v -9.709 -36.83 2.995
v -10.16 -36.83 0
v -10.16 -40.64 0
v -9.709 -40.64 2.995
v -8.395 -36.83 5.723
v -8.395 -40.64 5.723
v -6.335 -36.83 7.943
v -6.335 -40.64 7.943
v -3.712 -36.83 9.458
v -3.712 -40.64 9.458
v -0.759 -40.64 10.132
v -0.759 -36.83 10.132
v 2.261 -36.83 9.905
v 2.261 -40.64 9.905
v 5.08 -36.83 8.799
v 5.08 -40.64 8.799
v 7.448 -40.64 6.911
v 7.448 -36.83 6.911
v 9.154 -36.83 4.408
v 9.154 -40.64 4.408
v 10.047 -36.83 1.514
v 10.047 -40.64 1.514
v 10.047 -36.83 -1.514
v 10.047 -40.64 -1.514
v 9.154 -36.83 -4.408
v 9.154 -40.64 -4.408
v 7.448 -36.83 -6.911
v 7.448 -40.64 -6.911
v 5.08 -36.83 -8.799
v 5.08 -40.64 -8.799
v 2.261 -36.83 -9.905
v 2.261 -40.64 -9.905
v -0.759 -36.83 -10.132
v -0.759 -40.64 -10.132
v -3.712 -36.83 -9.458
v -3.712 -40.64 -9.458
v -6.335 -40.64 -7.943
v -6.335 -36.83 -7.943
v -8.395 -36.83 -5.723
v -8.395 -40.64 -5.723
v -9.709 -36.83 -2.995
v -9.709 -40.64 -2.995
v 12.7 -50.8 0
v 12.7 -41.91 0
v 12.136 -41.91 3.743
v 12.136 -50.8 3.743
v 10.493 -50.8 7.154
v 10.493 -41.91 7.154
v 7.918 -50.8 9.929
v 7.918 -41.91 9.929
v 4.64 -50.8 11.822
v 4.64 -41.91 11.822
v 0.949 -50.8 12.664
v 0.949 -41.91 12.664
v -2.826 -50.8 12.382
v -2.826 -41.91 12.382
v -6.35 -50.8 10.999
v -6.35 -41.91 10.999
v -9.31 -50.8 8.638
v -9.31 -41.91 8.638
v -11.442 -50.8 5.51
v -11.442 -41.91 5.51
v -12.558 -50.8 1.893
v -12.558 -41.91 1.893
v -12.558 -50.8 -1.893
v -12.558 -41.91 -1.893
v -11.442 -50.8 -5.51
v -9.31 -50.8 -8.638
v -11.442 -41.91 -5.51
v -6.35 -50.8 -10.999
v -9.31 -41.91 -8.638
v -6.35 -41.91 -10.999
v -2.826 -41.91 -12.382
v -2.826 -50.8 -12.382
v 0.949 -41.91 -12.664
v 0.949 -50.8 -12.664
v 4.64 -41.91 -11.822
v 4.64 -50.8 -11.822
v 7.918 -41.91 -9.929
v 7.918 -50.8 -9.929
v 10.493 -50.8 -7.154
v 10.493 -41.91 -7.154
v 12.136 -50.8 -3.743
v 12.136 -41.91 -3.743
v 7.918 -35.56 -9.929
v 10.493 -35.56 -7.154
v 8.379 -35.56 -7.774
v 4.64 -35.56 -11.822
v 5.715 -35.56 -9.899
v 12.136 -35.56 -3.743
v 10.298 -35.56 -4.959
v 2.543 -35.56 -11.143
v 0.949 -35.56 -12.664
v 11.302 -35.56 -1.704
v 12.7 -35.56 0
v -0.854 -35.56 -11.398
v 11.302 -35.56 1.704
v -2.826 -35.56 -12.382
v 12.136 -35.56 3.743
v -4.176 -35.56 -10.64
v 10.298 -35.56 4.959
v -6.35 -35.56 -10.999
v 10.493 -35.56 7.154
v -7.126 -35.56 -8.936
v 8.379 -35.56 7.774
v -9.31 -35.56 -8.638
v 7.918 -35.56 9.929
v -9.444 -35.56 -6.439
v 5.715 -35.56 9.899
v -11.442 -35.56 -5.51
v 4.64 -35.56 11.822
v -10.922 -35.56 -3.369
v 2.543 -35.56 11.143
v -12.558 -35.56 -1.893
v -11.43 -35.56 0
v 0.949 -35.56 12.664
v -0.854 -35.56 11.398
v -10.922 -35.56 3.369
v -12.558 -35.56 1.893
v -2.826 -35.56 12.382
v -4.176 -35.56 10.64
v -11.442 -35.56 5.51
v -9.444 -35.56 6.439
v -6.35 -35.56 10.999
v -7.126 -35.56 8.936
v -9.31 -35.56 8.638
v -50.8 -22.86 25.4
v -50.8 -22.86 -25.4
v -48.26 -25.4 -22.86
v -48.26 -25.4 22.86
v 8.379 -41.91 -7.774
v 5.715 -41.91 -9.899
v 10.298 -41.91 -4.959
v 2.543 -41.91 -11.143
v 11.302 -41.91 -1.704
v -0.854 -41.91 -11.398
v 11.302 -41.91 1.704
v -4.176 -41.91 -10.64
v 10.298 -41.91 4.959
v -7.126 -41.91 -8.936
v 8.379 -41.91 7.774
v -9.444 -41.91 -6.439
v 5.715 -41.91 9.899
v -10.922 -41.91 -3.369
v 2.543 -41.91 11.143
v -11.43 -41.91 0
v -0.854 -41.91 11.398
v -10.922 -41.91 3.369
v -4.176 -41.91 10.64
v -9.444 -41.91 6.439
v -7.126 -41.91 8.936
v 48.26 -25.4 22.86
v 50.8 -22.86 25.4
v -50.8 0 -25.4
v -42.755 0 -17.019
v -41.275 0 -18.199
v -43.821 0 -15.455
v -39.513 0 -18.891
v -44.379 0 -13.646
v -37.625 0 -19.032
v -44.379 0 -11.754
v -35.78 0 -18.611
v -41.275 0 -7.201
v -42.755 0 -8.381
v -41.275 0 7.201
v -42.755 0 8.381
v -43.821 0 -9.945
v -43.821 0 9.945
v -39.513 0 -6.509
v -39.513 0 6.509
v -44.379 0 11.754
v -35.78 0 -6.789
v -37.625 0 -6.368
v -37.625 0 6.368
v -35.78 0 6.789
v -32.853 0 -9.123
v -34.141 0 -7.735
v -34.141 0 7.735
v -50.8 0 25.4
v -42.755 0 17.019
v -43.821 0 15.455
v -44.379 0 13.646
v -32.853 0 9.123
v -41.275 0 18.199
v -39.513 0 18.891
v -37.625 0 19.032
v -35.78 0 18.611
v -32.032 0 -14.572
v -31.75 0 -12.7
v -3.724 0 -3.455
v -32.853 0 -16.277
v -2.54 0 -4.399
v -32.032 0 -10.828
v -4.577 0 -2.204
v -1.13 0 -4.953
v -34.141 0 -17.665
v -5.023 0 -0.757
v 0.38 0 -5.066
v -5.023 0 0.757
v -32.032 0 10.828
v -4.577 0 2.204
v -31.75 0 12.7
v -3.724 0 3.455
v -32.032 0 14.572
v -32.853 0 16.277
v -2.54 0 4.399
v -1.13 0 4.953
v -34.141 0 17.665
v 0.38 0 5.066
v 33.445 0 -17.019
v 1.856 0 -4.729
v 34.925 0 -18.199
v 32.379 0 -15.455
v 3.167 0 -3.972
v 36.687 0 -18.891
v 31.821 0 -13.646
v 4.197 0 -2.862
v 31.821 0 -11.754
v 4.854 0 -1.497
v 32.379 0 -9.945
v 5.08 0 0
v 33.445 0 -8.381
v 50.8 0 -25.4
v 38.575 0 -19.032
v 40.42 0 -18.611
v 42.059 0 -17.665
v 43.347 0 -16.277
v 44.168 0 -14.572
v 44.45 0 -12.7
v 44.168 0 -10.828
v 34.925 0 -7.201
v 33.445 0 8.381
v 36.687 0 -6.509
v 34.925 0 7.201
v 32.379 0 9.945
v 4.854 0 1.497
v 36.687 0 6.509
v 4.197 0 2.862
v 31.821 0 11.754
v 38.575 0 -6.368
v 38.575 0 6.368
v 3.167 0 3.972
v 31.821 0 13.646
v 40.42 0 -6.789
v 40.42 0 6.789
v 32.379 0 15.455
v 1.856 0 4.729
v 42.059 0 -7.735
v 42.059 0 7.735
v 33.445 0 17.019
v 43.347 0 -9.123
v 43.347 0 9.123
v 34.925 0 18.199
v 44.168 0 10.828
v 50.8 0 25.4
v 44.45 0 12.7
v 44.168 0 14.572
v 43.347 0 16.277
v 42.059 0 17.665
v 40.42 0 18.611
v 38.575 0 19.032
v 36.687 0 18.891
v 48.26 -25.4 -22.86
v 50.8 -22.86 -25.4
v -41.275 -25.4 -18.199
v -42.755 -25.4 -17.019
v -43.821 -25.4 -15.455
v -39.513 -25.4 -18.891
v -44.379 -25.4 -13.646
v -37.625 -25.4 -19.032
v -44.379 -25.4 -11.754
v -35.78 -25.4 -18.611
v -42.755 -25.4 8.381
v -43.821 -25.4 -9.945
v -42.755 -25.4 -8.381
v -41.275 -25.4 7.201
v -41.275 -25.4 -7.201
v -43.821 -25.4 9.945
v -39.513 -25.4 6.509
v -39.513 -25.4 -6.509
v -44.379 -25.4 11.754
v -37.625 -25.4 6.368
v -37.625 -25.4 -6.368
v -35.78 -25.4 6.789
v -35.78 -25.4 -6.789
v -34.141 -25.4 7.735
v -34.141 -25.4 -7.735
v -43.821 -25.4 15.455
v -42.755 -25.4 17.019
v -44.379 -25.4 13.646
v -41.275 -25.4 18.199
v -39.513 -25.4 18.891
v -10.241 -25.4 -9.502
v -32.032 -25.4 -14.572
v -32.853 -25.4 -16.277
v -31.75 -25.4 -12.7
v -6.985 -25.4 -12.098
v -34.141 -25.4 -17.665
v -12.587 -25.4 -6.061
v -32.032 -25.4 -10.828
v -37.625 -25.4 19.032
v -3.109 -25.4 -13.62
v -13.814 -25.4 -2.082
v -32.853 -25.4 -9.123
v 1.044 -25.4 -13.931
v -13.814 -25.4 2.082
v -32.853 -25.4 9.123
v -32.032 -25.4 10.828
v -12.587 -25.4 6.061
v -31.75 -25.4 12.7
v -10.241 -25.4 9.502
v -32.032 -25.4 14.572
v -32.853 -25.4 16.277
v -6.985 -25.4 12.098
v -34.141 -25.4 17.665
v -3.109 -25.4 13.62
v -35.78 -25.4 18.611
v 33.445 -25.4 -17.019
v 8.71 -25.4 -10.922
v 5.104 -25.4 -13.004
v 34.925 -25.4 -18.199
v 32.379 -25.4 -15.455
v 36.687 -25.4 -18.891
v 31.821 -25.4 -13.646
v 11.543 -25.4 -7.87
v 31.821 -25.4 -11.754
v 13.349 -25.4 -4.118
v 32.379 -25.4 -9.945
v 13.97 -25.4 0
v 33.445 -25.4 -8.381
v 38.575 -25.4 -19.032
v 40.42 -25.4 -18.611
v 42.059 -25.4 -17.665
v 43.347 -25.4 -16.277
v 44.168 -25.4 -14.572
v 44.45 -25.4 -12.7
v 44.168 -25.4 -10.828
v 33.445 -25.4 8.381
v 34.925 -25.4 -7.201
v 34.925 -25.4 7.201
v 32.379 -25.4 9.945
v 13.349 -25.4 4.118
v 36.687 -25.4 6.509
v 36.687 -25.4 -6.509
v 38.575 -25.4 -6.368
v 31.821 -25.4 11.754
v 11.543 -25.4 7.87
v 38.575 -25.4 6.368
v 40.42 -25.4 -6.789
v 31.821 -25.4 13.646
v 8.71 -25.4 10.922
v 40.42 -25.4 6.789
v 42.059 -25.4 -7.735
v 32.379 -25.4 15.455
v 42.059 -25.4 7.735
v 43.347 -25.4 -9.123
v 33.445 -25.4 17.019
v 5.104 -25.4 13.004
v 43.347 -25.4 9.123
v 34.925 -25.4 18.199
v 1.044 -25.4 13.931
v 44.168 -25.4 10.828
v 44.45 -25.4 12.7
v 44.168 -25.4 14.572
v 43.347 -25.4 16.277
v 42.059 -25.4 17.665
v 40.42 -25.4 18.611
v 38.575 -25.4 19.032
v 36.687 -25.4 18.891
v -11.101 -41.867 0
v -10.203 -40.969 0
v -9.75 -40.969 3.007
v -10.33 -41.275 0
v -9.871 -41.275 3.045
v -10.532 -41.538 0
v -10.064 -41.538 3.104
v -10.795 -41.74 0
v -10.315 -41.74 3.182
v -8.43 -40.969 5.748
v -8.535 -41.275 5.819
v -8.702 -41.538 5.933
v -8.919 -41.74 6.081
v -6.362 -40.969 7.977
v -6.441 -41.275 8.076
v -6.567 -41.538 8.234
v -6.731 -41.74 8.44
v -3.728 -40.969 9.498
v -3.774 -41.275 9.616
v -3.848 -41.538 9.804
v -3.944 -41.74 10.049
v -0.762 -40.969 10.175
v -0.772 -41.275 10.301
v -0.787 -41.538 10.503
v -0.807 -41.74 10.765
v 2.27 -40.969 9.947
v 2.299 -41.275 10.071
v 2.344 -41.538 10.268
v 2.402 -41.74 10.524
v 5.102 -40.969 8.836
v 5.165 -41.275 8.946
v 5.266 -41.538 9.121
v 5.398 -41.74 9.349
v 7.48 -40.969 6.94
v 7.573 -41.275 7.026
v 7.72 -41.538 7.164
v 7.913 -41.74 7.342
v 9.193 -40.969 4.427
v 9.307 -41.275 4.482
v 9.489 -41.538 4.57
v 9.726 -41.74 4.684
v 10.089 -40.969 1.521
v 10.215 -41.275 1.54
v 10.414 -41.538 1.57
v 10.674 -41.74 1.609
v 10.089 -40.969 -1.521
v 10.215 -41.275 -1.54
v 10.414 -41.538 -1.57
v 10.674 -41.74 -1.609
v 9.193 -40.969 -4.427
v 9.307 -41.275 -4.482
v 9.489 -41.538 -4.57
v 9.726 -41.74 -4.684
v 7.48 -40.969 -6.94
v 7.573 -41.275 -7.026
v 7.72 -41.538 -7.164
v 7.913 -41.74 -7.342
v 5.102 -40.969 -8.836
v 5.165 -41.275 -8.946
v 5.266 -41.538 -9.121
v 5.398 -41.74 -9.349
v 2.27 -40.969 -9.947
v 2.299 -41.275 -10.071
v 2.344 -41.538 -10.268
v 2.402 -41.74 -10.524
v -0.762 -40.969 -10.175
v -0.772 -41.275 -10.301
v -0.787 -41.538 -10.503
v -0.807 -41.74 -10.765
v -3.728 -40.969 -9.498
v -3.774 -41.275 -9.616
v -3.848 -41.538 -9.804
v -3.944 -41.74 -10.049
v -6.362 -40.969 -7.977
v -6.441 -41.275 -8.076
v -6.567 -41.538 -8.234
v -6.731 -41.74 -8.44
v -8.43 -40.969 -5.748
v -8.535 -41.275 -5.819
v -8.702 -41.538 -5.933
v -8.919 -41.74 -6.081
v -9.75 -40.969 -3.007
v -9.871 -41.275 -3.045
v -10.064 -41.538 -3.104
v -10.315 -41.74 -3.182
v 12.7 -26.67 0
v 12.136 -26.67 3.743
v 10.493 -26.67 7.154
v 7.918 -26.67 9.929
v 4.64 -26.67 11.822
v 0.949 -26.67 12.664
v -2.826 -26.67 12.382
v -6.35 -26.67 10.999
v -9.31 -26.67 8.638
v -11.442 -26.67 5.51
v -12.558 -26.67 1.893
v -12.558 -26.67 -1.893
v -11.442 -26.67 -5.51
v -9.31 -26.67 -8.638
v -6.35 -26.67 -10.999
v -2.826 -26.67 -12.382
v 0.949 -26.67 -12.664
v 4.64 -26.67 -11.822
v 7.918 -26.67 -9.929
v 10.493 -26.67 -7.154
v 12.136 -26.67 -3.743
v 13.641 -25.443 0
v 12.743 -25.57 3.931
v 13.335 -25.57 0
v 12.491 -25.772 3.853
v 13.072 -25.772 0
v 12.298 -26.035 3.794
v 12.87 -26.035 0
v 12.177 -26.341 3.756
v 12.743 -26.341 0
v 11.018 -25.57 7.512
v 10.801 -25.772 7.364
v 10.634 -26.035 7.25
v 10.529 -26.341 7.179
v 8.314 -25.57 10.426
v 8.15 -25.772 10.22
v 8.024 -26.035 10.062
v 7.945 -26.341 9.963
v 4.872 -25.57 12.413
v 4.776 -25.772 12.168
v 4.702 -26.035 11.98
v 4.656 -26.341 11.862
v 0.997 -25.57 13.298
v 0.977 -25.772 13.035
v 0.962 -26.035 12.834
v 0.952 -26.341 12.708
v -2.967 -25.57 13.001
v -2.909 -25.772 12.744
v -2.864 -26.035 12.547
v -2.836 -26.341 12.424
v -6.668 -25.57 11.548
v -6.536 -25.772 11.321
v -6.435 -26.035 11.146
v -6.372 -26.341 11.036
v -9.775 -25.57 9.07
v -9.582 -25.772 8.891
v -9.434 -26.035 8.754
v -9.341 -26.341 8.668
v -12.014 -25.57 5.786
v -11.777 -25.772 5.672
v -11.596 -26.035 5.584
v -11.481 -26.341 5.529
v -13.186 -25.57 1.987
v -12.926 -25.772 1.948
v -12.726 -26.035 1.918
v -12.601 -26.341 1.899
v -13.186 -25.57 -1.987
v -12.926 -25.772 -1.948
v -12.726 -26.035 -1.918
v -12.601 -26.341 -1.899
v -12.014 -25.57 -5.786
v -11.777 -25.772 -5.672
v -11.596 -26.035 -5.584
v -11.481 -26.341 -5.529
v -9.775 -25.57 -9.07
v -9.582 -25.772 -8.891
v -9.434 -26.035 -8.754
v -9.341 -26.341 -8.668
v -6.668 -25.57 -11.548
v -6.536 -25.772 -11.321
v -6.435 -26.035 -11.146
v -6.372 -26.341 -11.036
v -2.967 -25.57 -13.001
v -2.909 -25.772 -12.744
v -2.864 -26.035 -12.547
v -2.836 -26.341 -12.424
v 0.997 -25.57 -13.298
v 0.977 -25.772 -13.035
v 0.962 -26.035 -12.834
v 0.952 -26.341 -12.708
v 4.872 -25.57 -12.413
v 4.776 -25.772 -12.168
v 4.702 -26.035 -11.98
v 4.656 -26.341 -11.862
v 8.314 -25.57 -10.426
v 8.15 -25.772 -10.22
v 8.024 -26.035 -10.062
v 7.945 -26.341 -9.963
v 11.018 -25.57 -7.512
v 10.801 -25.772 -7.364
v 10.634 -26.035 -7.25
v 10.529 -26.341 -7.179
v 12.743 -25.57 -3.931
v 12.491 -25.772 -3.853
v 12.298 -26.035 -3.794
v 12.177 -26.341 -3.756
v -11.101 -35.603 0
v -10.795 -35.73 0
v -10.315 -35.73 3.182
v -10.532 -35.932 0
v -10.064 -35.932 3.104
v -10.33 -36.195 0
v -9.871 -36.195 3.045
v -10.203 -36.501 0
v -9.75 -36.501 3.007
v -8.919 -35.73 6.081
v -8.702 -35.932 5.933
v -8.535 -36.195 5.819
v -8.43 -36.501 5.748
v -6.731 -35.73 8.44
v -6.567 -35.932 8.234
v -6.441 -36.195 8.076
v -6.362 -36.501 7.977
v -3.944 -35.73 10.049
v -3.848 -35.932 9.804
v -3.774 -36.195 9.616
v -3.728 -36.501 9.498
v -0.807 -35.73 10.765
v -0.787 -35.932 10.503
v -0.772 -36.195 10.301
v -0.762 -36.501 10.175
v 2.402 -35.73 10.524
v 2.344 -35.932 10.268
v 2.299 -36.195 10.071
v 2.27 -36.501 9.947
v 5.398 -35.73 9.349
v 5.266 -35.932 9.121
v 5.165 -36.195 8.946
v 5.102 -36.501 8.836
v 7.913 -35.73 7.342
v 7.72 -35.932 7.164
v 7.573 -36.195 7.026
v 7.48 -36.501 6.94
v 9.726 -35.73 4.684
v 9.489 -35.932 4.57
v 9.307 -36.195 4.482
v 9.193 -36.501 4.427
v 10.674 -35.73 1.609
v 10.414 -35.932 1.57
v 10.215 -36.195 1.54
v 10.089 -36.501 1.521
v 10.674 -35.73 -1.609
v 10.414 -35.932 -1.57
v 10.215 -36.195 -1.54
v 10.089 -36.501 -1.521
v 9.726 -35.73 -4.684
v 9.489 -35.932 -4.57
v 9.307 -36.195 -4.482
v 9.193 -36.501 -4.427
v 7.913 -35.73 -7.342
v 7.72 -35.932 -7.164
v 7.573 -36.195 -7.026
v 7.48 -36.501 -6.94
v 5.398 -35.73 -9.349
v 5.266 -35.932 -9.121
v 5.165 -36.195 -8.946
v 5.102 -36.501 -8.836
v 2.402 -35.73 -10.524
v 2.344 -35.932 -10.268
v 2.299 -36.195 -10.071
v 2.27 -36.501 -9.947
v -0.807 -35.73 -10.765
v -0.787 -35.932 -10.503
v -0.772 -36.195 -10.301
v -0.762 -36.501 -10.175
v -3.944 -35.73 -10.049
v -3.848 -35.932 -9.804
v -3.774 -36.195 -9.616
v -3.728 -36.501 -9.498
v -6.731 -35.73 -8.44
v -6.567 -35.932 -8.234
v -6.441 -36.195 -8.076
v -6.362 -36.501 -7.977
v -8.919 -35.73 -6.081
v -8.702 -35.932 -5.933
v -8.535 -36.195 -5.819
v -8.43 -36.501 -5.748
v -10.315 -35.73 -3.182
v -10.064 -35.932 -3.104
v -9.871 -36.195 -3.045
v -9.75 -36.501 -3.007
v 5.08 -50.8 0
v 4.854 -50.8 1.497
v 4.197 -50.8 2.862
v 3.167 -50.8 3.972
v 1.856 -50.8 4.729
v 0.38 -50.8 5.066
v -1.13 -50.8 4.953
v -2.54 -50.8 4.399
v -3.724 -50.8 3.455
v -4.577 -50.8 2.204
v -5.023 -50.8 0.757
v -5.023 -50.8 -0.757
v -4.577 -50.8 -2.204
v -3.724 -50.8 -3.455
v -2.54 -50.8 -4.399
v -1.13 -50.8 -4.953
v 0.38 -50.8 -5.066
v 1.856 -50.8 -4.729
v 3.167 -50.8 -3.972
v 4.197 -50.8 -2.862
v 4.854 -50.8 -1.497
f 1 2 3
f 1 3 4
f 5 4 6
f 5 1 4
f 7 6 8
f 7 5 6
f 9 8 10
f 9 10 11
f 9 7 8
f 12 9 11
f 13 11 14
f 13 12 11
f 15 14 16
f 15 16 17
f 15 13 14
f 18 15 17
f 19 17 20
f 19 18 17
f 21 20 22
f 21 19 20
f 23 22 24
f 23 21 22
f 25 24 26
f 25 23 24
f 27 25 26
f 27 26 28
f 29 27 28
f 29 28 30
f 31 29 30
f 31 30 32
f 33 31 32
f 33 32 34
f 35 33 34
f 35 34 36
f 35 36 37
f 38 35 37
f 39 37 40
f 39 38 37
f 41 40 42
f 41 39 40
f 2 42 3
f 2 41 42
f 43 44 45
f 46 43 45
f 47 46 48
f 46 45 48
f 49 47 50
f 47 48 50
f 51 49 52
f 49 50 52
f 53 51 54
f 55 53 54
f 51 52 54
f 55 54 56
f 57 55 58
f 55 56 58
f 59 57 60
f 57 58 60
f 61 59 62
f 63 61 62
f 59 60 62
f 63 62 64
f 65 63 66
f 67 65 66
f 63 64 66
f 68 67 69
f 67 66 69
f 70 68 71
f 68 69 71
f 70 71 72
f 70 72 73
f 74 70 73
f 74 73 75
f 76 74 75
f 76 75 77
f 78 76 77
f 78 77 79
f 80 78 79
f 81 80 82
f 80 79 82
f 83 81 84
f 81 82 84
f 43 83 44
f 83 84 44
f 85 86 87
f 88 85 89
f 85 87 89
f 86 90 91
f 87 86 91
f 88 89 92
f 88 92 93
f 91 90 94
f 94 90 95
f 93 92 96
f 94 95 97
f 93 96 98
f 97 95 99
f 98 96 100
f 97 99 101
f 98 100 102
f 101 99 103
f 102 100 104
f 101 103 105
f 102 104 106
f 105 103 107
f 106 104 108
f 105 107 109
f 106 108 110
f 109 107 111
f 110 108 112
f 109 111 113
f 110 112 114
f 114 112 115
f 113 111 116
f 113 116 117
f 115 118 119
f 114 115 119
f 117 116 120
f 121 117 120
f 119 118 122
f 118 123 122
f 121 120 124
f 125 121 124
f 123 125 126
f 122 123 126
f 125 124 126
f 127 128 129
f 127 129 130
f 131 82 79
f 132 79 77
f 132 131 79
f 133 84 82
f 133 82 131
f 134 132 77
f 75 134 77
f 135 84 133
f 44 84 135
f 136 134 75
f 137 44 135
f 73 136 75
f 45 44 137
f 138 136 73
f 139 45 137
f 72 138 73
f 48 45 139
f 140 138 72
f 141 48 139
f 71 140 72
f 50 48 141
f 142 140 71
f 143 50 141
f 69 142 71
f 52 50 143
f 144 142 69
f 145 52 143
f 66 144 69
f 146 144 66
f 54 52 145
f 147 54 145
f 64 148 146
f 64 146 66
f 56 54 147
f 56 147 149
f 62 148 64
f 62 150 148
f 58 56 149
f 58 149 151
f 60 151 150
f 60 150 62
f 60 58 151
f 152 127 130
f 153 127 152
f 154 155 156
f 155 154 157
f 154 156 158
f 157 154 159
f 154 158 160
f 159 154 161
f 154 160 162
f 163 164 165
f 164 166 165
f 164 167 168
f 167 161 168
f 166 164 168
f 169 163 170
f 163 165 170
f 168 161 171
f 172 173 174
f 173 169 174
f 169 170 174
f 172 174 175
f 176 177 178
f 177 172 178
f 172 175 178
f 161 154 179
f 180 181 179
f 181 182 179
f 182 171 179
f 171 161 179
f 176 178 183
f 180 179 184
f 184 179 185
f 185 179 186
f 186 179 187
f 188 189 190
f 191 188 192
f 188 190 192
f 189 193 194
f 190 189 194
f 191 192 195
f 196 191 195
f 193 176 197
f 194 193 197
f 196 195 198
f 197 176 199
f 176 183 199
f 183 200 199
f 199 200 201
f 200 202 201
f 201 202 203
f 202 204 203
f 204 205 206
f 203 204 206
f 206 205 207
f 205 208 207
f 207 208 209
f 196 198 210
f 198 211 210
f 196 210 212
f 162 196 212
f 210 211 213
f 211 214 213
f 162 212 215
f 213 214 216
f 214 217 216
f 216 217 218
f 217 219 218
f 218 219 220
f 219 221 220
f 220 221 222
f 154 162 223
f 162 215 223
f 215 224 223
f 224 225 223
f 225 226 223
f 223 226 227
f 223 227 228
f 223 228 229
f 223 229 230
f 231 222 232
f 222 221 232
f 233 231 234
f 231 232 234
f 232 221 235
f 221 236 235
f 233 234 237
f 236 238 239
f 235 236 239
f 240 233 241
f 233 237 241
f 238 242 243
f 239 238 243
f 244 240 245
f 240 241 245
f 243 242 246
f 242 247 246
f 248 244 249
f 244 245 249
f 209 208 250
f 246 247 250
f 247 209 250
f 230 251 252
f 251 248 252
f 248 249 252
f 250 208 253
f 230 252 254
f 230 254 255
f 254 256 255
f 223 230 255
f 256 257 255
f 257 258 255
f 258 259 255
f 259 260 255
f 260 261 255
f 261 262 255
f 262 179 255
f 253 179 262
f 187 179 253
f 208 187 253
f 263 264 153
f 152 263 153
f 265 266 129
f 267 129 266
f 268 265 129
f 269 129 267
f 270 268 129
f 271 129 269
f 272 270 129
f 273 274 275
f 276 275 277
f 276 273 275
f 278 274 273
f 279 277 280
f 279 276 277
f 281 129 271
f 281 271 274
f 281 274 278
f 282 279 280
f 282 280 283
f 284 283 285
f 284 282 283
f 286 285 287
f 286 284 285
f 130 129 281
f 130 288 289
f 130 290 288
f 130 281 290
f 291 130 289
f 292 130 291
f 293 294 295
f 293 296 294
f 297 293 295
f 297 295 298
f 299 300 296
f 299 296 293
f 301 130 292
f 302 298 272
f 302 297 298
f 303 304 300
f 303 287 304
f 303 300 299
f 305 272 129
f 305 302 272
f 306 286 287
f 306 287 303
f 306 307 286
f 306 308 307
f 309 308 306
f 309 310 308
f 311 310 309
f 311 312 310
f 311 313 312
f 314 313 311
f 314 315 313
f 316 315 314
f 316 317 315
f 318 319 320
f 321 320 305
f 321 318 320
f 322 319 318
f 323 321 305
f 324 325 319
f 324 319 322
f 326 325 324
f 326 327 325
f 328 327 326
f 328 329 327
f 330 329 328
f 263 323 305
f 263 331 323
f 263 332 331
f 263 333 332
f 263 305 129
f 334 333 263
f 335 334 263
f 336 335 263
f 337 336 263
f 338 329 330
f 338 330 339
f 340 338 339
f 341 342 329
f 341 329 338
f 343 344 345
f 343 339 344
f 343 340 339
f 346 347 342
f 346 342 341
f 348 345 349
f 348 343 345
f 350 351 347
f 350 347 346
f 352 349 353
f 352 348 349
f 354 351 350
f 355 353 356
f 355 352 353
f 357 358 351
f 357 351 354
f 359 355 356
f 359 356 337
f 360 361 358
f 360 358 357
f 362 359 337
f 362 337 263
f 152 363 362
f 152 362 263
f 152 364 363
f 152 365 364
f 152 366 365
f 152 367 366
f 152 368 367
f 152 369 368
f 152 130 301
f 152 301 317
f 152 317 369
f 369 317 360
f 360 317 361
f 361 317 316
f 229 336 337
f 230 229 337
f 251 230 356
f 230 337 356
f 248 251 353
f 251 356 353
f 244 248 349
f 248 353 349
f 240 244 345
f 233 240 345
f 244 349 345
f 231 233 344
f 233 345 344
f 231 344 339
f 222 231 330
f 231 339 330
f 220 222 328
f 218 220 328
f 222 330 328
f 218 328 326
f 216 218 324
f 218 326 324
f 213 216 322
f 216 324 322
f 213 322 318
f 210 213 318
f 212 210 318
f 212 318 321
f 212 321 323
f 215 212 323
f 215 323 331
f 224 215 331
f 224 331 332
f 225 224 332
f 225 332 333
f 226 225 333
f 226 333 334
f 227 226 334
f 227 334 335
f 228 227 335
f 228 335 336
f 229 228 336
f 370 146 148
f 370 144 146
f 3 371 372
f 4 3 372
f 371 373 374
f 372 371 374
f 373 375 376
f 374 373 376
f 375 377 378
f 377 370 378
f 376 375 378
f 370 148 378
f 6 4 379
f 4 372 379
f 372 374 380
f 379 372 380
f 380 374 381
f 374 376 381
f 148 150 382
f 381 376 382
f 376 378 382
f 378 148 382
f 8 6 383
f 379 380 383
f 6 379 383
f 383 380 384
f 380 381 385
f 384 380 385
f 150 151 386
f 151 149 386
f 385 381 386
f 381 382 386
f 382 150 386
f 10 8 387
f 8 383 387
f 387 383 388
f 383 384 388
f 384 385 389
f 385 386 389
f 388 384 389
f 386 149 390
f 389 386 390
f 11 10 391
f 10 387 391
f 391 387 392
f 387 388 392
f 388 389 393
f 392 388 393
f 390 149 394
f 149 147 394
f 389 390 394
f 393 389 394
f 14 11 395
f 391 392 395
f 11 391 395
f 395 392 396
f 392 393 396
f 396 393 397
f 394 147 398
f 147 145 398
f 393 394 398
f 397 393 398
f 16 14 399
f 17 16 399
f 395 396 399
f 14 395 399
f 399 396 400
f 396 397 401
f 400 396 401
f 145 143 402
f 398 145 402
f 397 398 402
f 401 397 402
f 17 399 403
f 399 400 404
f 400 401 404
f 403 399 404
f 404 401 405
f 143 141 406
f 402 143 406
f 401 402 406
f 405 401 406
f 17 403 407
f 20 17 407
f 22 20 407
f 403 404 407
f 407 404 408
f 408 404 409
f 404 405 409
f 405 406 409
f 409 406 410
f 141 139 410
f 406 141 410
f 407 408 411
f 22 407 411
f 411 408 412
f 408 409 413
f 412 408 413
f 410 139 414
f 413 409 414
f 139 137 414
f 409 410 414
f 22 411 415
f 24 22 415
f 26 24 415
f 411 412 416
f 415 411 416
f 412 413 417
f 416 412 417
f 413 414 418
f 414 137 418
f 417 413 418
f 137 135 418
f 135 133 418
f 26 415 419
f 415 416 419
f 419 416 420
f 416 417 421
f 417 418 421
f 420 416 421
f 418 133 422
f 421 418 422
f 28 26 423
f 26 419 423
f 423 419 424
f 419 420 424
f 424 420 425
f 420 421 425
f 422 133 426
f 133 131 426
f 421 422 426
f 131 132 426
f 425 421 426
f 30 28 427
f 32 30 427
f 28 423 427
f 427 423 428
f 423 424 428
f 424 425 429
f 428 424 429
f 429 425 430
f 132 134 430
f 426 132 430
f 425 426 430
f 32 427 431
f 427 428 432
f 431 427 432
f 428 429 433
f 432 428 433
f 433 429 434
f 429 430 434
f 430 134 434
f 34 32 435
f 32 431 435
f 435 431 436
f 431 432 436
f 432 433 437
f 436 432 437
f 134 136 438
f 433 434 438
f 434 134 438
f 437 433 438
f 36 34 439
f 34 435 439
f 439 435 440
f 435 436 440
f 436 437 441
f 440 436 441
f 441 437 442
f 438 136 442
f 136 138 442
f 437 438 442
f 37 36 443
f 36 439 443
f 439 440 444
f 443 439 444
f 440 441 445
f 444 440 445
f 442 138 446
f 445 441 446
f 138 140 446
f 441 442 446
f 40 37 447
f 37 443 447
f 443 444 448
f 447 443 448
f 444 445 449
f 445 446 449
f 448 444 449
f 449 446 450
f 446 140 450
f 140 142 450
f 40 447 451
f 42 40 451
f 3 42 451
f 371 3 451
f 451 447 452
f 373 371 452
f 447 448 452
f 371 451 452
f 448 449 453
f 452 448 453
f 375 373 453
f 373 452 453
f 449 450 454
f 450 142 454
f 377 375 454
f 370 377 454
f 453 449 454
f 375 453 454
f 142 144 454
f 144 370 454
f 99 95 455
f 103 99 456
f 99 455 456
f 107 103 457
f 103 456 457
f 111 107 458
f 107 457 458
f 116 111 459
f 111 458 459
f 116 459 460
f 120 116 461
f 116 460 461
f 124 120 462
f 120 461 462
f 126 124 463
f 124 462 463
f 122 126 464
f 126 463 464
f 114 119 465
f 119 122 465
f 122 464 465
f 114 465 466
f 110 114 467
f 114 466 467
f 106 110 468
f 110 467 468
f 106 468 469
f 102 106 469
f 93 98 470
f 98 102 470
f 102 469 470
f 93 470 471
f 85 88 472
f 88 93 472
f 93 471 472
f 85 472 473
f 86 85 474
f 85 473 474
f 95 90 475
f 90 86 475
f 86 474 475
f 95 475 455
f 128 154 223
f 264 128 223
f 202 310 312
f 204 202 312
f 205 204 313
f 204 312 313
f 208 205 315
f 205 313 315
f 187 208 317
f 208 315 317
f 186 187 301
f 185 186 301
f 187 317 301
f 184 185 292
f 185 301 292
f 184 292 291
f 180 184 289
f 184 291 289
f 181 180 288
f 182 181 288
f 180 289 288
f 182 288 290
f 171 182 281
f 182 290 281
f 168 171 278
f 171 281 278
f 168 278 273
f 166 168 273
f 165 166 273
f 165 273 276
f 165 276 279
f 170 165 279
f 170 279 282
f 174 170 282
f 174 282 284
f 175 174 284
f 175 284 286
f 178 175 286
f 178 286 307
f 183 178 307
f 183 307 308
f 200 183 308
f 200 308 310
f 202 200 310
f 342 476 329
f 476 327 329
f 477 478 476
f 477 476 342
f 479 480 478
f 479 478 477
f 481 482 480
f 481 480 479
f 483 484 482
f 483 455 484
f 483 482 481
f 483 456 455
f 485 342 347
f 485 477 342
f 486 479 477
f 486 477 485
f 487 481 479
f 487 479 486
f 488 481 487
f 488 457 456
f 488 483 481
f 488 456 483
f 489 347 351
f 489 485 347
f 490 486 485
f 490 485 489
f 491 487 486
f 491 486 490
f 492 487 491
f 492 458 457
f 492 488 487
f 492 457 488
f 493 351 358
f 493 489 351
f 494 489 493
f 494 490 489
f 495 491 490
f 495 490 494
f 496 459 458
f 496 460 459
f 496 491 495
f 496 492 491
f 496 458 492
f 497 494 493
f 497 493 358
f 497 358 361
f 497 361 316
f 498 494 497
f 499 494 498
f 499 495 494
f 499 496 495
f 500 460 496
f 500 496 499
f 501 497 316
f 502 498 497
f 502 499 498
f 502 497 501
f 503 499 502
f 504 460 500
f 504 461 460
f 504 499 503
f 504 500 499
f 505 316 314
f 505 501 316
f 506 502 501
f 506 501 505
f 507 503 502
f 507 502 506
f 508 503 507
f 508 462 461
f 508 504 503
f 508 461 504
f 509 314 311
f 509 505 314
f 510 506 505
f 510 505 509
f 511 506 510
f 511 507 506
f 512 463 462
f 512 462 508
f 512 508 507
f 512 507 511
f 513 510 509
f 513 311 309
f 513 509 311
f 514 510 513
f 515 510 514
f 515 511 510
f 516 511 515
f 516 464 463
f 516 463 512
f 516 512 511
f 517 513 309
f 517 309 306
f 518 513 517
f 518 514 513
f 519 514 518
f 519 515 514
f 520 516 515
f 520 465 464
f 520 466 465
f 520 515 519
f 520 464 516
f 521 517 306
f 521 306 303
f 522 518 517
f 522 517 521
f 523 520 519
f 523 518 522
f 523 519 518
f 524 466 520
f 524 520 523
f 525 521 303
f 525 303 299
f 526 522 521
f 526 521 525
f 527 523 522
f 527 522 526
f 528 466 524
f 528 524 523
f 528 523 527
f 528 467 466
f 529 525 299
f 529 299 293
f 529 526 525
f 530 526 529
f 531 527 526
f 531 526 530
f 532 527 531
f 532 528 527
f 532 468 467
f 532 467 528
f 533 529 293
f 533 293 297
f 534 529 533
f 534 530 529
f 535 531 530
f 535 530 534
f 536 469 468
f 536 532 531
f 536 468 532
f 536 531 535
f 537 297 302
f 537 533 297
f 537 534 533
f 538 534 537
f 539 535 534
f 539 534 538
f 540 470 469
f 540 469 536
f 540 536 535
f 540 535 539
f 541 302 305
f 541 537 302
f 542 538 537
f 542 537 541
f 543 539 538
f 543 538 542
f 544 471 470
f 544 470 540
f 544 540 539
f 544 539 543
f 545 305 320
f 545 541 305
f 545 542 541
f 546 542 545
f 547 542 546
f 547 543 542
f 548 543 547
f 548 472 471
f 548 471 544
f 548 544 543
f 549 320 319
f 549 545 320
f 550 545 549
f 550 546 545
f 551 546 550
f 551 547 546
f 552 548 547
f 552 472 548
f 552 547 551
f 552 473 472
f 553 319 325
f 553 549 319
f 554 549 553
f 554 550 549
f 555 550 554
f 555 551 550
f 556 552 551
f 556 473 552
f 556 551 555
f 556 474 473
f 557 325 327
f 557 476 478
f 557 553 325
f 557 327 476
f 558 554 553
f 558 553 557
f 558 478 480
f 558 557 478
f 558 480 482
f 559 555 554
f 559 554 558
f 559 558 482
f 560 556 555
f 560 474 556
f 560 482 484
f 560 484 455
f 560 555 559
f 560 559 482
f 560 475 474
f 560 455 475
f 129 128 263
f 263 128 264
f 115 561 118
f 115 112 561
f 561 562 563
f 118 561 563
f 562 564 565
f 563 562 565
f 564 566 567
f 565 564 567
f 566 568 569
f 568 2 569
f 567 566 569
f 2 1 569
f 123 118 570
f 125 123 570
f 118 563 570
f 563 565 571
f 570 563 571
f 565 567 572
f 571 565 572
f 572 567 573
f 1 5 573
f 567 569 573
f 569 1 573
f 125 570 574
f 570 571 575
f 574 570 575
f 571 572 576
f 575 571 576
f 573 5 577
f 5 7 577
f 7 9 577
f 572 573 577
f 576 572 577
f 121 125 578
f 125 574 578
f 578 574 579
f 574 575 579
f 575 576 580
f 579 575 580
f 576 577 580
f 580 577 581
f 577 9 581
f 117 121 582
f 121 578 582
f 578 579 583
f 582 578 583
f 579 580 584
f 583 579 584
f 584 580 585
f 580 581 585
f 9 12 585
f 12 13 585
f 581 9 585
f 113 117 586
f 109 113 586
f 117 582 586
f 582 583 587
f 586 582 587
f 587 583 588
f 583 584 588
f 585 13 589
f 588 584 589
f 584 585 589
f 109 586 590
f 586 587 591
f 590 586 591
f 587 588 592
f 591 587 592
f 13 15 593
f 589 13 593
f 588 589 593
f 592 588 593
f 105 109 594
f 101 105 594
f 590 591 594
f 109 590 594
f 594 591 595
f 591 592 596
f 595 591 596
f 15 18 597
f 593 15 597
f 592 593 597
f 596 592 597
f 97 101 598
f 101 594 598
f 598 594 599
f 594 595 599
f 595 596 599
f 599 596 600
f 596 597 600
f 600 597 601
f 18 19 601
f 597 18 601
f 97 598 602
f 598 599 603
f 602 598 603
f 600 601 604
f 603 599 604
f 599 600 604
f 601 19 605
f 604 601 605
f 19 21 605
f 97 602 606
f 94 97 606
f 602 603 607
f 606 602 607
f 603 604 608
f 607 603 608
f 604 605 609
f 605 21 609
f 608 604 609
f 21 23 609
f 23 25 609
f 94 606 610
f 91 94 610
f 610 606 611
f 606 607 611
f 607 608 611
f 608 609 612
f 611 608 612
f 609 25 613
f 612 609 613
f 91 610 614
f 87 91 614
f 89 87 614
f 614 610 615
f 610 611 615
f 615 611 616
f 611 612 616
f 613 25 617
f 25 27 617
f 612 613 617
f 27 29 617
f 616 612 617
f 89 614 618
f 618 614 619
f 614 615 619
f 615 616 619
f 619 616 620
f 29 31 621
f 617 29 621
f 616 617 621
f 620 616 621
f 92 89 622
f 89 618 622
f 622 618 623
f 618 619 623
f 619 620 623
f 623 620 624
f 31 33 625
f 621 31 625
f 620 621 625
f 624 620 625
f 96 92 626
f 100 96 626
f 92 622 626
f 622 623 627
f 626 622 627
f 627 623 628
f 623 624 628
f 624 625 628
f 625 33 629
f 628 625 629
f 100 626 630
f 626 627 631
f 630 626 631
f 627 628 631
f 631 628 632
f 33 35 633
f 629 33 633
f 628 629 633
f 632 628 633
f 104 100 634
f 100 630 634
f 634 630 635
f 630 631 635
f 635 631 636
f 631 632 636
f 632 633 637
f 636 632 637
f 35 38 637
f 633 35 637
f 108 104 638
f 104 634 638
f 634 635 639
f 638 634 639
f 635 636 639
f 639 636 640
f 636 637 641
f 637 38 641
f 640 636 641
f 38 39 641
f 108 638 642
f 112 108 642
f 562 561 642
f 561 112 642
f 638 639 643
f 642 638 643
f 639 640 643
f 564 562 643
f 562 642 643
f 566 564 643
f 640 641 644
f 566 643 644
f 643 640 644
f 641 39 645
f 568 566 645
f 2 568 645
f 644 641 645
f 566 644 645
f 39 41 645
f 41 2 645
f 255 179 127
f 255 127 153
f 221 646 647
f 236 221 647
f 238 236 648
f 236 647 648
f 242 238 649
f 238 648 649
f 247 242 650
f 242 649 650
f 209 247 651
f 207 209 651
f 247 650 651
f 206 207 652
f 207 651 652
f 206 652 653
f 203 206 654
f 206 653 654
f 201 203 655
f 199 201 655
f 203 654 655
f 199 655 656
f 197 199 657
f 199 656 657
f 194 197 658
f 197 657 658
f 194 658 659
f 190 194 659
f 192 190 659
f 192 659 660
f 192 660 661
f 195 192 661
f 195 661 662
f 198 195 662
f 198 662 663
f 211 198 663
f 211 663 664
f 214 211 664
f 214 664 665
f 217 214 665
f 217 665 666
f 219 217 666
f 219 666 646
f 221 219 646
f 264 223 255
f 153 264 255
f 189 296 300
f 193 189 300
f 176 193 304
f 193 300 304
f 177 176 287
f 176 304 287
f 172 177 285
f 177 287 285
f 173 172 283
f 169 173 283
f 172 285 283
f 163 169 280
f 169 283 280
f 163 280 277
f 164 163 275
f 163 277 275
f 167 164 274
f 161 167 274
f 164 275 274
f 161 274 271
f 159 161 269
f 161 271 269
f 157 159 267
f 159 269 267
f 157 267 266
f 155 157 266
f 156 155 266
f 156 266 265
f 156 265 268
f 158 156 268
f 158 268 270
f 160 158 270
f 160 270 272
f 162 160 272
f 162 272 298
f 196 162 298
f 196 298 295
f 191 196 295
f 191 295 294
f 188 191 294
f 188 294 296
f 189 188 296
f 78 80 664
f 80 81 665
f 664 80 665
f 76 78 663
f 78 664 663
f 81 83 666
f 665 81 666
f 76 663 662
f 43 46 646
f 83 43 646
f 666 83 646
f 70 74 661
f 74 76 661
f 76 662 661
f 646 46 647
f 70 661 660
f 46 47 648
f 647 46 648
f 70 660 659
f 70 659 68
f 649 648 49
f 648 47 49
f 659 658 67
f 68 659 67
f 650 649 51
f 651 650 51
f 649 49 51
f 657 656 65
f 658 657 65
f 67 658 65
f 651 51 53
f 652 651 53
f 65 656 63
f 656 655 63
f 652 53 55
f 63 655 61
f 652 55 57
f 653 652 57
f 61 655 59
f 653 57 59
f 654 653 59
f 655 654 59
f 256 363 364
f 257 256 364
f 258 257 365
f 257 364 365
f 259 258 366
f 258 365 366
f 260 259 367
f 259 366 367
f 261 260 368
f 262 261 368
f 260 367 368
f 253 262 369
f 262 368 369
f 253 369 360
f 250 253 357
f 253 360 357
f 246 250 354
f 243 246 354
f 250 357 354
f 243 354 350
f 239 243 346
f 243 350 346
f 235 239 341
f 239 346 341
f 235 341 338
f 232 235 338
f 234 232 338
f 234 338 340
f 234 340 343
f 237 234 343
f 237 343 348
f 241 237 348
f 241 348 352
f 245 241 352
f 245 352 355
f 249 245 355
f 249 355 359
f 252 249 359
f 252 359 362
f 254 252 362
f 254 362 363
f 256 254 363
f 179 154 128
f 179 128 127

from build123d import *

# Parameters (mm, degrees)
F0_W      = 101.6
F0_H      = 50.8
F1_DEPTH  = 25.4
F2_R      = 6.35
F3_DEPTH  = 25.401
F4_W      = 12.7
F4_H      = 25.4
F6_W      = 14.885251
F6_H      = 6.35
F8_R      = 1.27
F9_SIZE   = 2.54
F10_R     = 5.08
F11_DEPTH = 50.801


with BuildPart() as f1:
    # F0 (on Front) → F1 (new body)
    with BuildSketch(Plane.XZ):
        Rectangle(F0_W, F0_H)
    extrude(amount=F1_DEPTH)

    # F2 (on face) → F3 (cut, through all)
    with BuildSketch(Plane.XZ.offset(25.4)):
        with Locations((-38.1, 12.7)):
            Circle(F2_R)
        with Locations((38.1, 12.7)):
            Circle(F2_R)
        with Locations((38.1, -12.7)):
            Circle(F2_R)
        with Locations((-38.1, -12.7)):
            Circle(F2_R)
    extrude(amount=-F3_DEPTH, mode=Mode.SUBTRACT)

    # F4 (on Top) → F5 (revolve)
    with BuildSketch(Plane.XY):
        with Locations((6.35, -38.1)):
            Rectangle(F4_W, F4_H)
    revolve(axis=Axis((0, -38.1, 0), (0, -1, 0)))

    # F6 (on Top) → F7 (revolve, cut)
    with BuildSketch(Plane.XY):
        with Locations((-17.602626, -38.735)):
            Rectangle(F6_W, F6_H)
    revolve(axis=Axis((0, -35.056077, 0), (0, 1, 0)), mode=Mode.SUBTRACT)

    # F8
    f8_edges = [f1.edges().sort_by_distance(p)[0] for p in [
        (-12.7, -25.4, 0),
        (10.16, -35.56, 0),
        (10.16, -41.91, 0),
    ]]
    fillet(f8_edges, radius=F8_R)

    # F9
    f9_edges = [f1.edges().sort_by_distance(p)[0] for p in [
        (0, -25.4, -25.4),
        (0, -25.4, 25.4),
        (50.8, -25.4, 0),
        (-50.8, -25.4, 0),
    ]]
    chamfer(f9_edges, length=F9_SIZE)

    # F10 (on face) → F11 (cut, through all)
    with BuildSketch(Plane.XZ.offset(50.8)):
        Circle(F10_R)
    extrude(amount=-F11_DEPTH, mode=Mode.SUBTRACT)


solid = f1.part
